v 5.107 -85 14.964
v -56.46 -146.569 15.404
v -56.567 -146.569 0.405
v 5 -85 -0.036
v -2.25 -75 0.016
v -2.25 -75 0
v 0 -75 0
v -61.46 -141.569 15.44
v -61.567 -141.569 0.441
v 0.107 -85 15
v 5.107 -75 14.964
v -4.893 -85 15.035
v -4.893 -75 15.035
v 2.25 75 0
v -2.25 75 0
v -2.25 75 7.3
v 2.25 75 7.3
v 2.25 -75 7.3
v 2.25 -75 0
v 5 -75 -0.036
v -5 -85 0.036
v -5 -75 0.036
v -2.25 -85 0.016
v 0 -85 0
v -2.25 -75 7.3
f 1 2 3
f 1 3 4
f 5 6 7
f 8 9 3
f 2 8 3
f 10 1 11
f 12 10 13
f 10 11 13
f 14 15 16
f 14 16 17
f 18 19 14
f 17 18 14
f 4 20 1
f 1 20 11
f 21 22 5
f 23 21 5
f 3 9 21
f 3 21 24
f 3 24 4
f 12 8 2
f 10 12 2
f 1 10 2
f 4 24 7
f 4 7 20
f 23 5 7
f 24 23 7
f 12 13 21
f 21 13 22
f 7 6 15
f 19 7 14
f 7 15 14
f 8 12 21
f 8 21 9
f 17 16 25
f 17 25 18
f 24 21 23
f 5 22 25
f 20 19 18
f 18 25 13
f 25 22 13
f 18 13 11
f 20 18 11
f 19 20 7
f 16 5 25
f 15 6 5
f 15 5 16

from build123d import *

# Parameters (mm, degrees)
F0_W     = 4.5
F0_H     = 150
F1_DEPTH = 7.3
F3_DEPTH = 10
F5_DEPTH = 15


with BuildPart() as f1:
    # F0 (on Top) → F1 (new body)
    with BuildSketch(Plane.XY):
        Rectangle(F0_W, F0_H)
    extrude(amount=F1_DEPTH)

    # F2 (on face) → F3 (join)
    with BuildSketch(Plane.XZ.offset(75)):
        Polygon((-2.25, 0.016098), (0, 0), (2.25, 0), (2.25, 7.3), (-2.25, 7.3), align=None)
        Polygon((4.999872, -0.035773), (5.107192, 14.963843), (-4.892552, 15.035389), (-4.999872, 0.035773), (-2.25, 0.016098), (-2.25, 7.3), (2.25, 7.3), (2.25, 0), (0, 0), align=None)
    extrude(amount=F3_DEPTH)

    # F4 (on face) → F5 (join)
    with BuildSketch(Plane(origin=(0.10732, 0, 14.999616), x_dir=(0.999974, 0, -0.007155), z_dir=(0.007155, 0, 0.999974))):
        Polygon((5, -85), (-5, -85), (-61.568542, -141.568542), (-56.568542, -146.568542), align=None)
    extrude(amount=-F5_DEPTH)


solid = f1.part
